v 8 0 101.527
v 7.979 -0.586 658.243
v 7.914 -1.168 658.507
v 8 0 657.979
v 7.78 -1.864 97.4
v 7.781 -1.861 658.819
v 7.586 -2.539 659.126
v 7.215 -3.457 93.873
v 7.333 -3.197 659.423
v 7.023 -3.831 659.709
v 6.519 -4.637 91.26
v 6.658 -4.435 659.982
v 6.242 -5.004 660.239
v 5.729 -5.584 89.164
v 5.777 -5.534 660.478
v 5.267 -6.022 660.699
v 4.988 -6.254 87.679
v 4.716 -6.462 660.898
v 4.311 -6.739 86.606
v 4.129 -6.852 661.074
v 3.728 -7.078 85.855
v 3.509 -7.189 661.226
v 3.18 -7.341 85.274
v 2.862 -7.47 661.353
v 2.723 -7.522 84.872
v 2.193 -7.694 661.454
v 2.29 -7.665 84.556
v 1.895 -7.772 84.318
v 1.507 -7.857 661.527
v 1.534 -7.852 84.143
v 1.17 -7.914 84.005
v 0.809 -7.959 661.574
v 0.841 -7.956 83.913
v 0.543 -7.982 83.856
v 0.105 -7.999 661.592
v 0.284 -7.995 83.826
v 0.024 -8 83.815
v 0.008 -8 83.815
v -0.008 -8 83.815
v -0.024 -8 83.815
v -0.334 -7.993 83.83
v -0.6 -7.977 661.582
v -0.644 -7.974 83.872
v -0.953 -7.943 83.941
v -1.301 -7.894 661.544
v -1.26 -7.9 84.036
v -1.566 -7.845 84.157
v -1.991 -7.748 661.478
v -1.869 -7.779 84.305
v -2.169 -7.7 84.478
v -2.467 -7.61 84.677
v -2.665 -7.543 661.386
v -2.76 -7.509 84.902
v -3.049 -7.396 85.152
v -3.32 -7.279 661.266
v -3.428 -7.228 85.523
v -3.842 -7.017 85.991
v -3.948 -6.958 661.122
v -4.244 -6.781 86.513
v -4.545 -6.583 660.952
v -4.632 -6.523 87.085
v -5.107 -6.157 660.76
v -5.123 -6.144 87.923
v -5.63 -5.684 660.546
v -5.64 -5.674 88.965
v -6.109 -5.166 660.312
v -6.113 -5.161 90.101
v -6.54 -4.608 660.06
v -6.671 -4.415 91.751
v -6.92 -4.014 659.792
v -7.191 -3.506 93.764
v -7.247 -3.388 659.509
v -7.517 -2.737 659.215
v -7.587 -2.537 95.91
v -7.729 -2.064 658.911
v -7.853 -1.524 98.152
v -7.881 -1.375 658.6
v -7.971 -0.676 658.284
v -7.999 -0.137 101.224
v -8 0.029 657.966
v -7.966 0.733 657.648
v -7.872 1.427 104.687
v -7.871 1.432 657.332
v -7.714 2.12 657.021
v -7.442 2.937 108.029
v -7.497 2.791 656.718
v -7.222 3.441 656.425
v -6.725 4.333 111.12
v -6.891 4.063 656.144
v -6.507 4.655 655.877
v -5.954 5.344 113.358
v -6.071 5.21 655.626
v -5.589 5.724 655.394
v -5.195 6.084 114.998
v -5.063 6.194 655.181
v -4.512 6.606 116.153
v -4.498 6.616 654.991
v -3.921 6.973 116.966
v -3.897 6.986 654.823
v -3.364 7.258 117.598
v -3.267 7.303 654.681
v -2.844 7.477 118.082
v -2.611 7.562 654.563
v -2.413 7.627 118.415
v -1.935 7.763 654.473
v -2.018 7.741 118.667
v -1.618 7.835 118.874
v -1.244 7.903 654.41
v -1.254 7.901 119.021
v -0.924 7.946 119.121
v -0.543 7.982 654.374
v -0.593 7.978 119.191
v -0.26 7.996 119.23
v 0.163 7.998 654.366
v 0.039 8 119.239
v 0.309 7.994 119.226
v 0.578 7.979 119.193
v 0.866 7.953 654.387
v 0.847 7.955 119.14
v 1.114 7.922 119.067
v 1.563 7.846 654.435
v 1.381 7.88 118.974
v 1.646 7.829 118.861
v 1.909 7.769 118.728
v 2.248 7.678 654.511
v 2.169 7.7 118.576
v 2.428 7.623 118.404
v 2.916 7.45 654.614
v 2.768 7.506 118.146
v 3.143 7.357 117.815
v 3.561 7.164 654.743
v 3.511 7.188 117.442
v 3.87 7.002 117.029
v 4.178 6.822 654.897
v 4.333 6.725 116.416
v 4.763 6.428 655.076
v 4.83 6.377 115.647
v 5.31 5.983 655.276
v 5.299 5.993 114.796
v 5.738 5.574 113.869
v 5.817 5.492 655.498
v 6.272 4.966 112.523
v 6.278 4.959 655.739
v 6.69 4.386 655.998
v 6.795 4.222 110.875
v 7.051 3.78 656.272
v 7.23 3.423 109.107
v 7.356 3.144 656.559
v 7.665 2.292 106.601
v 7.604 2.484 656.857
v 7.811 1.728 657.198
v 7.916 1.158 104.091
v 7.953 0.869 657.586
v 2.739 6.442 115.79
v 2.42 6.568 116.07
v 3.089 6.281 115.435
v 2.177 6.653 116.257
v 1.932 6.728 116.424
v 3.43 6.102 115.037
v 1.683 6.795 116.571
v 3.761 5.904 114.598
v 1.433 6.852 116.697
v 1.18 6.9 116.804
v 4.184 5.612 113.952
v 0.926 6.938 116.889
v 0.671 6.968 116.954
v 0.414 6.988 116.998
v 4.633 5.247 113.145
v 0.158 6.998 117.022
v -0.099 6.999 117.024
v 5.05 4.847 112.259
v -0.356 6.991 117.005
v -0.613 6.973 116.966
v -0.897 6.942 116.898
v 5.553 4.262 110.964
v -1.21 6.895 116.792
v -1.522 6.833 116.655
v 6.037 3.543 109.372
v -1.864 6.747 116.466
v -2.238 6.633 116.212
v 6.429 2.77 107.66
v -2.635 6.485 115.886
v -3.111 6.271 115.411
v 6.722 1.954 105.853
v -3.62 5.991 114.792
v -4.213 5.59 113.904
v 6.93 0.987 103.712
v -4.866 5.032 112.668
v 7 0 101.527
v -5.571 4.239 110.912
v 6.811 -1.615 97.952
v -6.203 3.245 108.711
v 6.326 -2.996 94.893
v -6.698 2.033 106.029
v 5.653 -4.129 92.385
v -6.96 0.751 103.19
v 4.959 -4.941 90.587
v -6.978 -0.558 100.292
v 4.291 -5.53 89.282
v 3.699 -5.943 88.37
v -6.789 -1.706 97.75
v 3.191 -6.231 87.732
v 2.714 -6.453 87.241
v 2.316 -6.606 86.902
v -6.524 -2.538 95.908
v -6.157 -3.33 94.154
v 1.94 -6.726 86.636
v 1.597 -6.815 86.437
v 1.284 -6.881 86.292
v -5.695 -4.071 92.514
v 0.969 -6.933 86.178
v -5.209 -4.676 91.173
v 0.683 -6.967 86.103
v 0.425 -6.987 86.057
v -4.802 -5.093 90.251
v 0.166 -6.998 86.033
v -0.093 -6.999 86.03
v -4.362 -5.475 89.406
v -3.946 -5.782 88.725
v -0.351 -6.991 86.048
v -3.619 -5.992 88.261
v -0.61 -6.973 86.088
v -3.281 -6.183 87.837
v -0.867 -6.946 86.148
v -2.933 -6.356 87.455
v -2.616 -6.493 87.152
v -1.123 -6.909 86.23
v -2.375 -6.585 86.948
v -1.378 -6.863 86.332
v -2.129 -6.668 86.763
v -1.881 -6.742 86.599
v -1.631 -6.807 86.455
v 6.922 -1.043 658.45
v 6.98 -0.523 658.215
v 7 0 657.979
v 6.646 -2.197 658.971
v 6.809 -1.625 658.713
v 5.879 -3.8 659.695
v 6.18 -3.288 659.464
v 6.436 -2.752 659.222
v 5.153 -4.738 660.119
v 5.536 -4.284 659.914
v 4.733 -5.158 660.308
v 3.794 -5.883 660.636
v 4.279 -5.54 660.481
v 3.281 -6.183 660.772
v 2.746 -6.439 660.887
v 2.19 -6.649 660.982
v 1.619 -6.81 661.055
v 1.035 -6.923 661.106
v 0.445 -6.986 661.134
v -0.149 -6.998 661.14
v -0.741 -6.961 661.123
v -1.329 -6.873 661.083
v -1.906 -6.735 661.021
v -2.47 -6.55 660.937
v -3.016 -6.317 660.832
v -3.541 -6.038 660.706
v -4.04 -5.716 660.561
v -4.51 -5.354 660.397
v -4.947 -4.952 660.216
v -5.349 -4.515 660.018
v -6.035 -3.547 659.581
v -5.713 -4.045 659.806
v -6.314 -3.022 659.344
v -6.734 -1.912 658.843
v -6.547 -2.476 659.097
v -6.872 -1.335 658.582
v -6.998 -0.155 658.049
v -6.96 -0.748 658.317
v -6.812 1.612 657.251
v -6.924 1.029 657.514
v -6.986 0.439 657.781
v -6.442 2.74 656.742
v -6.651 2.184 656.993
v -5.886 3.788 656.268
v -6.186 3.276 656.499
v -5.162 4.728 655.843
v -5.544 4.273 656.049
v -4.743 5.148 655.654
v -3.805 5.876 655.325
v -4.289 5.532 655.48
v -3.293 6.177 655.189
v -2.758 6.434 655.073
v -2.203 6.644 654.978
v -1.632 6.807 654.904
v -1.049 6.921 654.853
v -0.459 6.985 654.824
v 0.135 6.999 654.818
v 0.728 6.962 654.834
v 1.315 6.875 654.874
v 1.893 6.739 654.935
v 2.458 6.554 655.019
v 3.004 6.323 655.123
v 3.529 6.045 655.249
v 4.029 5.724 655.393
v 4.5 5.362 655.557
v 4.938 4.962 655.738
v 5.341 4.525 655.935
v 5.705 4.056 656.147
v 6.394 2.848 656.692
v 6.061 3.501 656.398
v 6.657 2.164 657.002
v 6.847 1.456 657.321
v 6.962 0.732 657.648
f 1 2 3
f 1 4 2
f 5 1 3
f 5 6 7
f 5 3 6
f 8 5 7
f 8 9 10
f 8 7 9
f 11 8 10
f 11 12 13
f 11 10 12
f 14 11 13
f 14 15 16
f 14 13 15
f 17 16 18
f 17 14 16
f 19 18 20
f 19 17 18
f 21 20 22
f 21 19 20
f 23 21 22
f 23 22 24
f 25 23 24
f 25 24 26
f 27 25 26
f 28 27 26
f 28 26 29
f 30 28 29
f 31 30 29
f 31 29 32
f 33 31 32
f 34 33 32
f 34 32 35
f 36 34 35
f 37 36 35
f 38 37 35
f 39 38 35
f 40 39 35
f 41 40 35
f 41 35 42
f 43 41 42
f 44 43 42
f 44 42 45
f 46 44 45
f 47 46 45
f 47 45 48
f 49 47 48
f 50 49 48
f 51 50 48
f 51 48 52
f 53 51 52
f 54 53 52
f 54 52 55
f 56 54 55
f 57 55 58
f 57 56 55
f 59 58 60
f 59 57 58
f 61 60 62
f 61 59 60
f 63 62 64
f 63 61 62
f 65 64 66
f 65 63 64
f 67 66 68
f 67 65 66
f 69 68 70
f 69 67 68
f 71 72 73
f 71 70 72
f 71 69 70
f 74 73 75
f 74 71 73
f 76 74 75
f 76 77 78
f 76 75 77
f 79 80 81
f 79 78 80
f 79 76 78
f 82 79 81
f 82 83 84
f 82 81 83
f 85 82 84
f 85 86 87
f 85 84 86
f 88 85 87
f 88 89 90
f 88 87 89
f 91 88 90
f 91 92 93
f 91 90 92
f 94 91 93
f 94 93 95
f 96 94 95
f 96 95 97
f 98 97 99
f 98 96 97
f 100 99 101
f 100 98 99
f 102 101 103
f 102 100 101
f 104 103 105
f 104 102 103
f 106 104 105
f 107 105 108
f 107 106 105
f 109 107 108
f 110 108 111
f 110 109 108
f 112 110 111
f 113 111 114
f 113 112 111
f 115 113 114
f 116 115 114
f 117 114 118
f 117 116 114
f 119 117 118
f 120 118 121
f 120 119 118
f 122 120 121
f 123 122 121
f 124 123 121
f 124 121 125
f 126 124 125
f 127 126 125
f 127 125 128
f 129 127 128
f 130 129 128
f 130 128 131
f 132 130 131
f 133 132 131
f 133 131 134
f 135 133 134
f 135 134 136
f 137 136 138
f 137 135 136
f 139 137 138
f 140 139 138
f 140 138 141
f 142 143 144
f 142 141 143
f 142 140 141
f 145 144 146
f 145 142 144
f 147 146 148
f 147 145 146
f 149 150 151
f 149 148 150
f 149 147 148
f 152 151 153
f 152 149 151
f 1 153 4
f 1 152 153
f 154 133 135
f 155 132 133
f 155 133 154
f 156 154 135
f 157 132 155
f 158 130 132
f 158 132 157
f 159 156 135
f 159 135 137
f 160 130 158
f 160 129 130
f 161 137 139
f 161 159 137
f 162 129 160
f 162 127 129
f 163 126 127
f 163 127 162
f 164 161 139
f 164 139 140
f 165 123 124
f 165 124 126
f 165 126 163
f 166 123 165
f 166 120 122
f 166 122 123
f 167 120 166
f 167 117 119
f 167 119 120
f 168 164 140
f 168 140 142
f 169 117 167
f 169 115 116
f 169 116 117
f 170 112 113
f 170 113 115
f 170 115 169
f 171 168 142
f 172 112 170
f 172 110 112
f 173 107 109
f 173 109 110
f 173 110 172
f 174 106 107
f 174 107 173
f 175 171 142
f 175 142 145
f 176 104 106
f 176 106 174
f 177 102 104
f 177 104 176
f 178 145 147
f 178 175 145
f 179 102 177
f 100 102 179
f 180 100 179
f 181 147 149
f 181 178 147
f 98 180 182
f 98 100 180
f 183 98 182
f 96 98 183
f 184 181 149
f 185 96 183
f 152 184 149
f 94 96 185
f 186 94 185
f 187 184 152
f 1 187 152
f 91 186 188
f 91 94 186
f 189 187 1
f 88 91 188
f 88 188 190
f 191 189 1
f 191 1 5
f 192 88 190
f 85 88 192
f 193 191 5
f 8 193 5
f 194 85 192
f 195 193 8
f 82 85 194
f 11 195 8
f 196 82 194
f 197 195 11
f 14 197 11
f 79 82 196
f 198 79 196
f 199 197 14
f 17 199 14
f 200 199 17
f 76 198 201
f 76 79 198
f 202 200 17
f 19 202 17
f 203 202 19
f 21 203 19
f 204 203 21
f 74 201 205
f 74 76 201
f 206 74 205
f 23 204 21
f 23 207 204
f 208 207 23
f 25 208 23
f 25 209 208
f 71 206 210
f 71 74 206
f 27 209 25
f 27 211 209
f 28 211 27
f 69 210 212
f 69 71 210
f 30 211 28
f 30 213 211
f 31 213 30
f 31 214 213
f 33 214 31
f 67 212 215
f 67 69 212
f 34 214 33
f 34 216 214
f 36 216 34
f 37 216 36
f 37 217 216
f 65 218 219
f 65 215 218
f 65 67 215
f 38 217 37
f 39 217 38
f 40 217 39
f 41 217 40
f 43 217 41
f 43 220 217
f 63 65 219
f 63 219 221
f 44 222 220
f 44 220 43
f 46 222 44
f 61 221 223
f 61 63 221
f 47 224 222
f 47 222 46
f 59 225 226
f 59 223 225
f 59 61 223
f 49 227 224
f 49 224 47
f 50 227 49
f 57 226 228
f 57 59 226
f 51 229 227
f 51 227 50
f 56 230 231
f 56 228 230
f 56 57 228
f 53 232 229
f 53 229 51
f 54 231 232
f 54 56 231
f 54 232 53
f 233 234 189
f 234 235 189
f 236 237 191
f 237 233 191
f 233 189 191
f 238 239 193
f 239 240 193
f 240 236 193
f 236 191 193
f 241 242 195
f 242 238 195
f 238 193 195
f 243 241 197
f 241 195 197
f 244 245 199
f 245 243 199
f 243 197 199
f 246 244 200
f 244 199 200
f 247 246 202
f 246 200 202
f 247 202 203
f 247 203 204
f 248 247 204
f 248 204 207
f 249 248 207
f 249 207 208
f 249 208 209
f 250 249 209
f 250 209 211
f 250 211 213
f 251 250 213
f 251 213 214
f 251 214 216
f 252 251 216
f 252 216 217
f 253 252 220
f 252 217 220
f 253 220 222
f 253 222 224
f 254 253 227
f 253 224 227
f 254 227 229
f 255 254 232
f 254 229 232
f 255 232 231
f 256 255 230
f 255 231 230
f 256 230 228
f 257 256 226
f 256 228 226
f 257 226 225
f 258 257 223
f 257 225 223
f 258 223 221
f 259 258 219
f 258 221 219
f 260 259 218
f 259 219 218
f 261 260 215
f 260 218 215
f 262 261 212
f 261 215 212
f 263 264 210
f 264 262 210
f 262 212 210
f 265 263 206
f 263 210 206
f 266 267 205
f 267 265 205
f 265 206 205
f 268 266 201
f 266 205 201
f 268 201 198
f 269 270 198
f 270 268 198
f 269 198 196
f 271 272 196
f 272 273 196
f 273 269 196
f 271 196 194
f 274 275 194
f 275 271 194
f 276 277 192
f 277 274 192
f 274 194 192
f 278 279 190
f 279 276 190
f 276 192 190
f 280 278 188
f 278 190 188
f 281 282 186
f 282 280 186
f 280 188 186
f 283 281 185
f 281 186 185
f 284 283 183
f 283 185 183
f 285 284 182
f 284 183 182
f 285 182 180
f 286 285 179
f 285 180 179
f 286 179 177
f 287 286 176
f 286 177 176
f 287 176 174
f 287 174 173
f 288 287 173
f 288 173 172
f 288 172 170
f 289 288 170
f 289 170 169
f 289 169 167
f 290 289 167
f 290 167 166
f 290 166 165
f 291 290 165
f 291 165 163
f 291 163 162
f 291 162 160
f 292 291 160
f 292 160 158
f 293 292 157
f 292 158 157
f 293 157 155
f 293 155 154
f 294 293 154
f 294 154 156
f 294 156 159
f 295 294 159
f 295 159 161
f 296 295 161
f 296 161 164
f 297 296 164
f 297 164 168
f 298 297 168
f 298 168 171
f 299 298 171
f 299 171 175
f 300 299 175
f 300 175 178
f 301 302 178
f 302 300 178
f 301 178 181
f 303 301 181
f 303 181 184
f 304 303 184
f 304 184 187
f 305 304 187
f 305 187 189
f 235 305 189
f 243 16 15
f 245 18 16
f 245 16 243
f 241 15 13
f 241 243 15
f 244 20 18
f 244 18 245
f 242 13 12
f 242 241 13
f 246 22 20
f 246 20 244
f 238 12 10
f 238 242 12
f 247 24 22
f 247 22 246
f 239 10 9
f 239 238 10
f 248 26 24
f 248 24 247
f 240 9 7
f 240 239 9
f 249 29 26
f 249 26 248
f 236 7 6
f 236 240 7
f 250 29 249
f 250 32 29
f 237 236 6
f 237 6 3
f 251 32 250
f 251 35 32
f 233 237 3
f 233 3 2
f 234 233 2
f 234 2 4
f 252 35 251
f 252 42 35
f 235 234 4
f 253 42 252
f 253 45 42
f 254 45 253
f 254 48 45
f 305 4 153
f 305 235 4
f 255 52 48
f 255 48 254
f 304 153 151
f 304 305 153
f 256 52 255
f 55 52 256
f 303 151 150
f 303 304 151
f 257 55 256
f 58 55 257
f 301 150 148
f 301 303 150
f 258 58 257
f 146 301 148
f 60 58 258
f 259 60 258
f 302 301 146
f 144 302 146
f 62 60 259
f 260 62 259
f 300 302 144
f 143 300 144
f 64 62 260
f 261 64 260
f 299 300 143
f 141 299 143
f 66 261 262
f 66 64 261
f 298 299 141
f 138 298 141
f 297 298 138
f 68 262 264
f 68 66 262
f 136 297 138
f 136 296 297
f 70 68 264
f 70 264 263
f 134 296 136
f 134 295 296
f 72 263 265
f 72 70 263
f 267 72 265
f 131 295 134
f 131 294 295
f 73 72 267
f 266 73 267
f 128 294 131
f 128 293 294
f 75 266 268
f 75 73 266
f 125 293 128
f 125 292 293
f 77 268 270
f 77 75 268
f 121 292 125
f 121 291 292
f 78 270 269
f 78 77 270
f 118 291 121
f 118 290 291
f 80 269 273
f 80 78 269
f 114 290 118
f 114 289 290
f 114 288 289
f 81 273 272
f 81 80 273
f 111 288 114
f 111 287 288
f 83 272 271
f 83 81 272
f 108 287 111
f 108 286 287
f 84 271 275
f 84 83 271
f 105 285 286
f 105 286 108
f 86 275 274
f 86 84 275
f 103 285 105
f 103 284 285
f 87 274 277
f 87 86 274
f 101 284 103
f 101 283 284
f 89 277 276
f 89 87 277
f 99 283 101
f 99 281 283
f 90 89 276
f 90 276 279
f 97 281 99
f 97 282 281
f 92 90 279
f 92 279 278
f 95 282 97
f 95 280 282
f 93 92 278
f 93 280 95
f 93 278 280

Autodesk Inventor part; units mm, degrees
ref_plane "Начальная плоскость" through (0, 0, 83.8147) normal (0, 0, 1) x (1, 0, 0)
ref_plane "Конечная плоскость" through (0, 0, 661.5922) normal (0, 0, 1) x (1, 0, 0)
sketch "Эскиз" plane through (0, 0, 0) normal (0, 0, 1) x (1, 0, 0)
  circle A0 centre (0, 0) radius 7
  circle A1 centre (0, 0) radius 8
  dimension "d0" = 16
  dimension "d1" = 1
extrude "Тело" add sketch "Эскиз" along normal up to surface (577.7775 mm away) from surface at 83.8147
sketch "Sketch3" plane through (0, 0, 0) normal (0, 0, 1) x (1, 0, 0)
  line L0 (0, 0) -> (10, 0)
ref_plane "Work Plane3" through (0, 0, 0) normal (0, -1, 0) x (1, 0, 0)
sketch "Sketch4" plane through (0, 0, 0) normal (0, -1, 0) x (1, 0, 0)
  line L0 (-2, 83.8147) -> (12, 83.8147)
  line L1 (-2, 661.5922) -> (12, 661.5922)
  dimension "d7" = 577.7775
ref_plane "РабПлоскость4" through (-8, 240.1857, 549.4966) normal (0, 0.4116224, 0.9113545) x (1, 0, 0)
split "Разделение1" plane through (-8, 240.1857, 549.4966) removes the side toward (0, 0.4116224, 0.9113545)
ref_plane "РабПлоскость5" through (-8, 209.5672, 565.5203) normal (0, 0.9113545, -0.4116224) x (1, 0, 0)
split "Разделение2" plane through (-8, 209.5672, 565.5203) removes the side toward (0, 0.9113545, -0.4116224)
equation "\"d0\" = G_H"
equation "\"d1\" = G_T"
equation "\"d2\" = G_L"
equation "\"G_H\" = 16"
equation "\"G_T\" = 1"
equation "\"G_L\" = d7"
equation "\"G_OFFSET_START\" = -83.81468"
equation "\"G_OFFSET_END\" = -2.19454"
equation "\"d4\" = -G_OFFSET_START"
equation "\"d5\" = G_OFFSET_END + B_L"
equation "\"B_L\" = 663.78672"
properties part number "Труба 16x1-577,78 ГОСТ 10704-91" material "Сталь, мягкая"
